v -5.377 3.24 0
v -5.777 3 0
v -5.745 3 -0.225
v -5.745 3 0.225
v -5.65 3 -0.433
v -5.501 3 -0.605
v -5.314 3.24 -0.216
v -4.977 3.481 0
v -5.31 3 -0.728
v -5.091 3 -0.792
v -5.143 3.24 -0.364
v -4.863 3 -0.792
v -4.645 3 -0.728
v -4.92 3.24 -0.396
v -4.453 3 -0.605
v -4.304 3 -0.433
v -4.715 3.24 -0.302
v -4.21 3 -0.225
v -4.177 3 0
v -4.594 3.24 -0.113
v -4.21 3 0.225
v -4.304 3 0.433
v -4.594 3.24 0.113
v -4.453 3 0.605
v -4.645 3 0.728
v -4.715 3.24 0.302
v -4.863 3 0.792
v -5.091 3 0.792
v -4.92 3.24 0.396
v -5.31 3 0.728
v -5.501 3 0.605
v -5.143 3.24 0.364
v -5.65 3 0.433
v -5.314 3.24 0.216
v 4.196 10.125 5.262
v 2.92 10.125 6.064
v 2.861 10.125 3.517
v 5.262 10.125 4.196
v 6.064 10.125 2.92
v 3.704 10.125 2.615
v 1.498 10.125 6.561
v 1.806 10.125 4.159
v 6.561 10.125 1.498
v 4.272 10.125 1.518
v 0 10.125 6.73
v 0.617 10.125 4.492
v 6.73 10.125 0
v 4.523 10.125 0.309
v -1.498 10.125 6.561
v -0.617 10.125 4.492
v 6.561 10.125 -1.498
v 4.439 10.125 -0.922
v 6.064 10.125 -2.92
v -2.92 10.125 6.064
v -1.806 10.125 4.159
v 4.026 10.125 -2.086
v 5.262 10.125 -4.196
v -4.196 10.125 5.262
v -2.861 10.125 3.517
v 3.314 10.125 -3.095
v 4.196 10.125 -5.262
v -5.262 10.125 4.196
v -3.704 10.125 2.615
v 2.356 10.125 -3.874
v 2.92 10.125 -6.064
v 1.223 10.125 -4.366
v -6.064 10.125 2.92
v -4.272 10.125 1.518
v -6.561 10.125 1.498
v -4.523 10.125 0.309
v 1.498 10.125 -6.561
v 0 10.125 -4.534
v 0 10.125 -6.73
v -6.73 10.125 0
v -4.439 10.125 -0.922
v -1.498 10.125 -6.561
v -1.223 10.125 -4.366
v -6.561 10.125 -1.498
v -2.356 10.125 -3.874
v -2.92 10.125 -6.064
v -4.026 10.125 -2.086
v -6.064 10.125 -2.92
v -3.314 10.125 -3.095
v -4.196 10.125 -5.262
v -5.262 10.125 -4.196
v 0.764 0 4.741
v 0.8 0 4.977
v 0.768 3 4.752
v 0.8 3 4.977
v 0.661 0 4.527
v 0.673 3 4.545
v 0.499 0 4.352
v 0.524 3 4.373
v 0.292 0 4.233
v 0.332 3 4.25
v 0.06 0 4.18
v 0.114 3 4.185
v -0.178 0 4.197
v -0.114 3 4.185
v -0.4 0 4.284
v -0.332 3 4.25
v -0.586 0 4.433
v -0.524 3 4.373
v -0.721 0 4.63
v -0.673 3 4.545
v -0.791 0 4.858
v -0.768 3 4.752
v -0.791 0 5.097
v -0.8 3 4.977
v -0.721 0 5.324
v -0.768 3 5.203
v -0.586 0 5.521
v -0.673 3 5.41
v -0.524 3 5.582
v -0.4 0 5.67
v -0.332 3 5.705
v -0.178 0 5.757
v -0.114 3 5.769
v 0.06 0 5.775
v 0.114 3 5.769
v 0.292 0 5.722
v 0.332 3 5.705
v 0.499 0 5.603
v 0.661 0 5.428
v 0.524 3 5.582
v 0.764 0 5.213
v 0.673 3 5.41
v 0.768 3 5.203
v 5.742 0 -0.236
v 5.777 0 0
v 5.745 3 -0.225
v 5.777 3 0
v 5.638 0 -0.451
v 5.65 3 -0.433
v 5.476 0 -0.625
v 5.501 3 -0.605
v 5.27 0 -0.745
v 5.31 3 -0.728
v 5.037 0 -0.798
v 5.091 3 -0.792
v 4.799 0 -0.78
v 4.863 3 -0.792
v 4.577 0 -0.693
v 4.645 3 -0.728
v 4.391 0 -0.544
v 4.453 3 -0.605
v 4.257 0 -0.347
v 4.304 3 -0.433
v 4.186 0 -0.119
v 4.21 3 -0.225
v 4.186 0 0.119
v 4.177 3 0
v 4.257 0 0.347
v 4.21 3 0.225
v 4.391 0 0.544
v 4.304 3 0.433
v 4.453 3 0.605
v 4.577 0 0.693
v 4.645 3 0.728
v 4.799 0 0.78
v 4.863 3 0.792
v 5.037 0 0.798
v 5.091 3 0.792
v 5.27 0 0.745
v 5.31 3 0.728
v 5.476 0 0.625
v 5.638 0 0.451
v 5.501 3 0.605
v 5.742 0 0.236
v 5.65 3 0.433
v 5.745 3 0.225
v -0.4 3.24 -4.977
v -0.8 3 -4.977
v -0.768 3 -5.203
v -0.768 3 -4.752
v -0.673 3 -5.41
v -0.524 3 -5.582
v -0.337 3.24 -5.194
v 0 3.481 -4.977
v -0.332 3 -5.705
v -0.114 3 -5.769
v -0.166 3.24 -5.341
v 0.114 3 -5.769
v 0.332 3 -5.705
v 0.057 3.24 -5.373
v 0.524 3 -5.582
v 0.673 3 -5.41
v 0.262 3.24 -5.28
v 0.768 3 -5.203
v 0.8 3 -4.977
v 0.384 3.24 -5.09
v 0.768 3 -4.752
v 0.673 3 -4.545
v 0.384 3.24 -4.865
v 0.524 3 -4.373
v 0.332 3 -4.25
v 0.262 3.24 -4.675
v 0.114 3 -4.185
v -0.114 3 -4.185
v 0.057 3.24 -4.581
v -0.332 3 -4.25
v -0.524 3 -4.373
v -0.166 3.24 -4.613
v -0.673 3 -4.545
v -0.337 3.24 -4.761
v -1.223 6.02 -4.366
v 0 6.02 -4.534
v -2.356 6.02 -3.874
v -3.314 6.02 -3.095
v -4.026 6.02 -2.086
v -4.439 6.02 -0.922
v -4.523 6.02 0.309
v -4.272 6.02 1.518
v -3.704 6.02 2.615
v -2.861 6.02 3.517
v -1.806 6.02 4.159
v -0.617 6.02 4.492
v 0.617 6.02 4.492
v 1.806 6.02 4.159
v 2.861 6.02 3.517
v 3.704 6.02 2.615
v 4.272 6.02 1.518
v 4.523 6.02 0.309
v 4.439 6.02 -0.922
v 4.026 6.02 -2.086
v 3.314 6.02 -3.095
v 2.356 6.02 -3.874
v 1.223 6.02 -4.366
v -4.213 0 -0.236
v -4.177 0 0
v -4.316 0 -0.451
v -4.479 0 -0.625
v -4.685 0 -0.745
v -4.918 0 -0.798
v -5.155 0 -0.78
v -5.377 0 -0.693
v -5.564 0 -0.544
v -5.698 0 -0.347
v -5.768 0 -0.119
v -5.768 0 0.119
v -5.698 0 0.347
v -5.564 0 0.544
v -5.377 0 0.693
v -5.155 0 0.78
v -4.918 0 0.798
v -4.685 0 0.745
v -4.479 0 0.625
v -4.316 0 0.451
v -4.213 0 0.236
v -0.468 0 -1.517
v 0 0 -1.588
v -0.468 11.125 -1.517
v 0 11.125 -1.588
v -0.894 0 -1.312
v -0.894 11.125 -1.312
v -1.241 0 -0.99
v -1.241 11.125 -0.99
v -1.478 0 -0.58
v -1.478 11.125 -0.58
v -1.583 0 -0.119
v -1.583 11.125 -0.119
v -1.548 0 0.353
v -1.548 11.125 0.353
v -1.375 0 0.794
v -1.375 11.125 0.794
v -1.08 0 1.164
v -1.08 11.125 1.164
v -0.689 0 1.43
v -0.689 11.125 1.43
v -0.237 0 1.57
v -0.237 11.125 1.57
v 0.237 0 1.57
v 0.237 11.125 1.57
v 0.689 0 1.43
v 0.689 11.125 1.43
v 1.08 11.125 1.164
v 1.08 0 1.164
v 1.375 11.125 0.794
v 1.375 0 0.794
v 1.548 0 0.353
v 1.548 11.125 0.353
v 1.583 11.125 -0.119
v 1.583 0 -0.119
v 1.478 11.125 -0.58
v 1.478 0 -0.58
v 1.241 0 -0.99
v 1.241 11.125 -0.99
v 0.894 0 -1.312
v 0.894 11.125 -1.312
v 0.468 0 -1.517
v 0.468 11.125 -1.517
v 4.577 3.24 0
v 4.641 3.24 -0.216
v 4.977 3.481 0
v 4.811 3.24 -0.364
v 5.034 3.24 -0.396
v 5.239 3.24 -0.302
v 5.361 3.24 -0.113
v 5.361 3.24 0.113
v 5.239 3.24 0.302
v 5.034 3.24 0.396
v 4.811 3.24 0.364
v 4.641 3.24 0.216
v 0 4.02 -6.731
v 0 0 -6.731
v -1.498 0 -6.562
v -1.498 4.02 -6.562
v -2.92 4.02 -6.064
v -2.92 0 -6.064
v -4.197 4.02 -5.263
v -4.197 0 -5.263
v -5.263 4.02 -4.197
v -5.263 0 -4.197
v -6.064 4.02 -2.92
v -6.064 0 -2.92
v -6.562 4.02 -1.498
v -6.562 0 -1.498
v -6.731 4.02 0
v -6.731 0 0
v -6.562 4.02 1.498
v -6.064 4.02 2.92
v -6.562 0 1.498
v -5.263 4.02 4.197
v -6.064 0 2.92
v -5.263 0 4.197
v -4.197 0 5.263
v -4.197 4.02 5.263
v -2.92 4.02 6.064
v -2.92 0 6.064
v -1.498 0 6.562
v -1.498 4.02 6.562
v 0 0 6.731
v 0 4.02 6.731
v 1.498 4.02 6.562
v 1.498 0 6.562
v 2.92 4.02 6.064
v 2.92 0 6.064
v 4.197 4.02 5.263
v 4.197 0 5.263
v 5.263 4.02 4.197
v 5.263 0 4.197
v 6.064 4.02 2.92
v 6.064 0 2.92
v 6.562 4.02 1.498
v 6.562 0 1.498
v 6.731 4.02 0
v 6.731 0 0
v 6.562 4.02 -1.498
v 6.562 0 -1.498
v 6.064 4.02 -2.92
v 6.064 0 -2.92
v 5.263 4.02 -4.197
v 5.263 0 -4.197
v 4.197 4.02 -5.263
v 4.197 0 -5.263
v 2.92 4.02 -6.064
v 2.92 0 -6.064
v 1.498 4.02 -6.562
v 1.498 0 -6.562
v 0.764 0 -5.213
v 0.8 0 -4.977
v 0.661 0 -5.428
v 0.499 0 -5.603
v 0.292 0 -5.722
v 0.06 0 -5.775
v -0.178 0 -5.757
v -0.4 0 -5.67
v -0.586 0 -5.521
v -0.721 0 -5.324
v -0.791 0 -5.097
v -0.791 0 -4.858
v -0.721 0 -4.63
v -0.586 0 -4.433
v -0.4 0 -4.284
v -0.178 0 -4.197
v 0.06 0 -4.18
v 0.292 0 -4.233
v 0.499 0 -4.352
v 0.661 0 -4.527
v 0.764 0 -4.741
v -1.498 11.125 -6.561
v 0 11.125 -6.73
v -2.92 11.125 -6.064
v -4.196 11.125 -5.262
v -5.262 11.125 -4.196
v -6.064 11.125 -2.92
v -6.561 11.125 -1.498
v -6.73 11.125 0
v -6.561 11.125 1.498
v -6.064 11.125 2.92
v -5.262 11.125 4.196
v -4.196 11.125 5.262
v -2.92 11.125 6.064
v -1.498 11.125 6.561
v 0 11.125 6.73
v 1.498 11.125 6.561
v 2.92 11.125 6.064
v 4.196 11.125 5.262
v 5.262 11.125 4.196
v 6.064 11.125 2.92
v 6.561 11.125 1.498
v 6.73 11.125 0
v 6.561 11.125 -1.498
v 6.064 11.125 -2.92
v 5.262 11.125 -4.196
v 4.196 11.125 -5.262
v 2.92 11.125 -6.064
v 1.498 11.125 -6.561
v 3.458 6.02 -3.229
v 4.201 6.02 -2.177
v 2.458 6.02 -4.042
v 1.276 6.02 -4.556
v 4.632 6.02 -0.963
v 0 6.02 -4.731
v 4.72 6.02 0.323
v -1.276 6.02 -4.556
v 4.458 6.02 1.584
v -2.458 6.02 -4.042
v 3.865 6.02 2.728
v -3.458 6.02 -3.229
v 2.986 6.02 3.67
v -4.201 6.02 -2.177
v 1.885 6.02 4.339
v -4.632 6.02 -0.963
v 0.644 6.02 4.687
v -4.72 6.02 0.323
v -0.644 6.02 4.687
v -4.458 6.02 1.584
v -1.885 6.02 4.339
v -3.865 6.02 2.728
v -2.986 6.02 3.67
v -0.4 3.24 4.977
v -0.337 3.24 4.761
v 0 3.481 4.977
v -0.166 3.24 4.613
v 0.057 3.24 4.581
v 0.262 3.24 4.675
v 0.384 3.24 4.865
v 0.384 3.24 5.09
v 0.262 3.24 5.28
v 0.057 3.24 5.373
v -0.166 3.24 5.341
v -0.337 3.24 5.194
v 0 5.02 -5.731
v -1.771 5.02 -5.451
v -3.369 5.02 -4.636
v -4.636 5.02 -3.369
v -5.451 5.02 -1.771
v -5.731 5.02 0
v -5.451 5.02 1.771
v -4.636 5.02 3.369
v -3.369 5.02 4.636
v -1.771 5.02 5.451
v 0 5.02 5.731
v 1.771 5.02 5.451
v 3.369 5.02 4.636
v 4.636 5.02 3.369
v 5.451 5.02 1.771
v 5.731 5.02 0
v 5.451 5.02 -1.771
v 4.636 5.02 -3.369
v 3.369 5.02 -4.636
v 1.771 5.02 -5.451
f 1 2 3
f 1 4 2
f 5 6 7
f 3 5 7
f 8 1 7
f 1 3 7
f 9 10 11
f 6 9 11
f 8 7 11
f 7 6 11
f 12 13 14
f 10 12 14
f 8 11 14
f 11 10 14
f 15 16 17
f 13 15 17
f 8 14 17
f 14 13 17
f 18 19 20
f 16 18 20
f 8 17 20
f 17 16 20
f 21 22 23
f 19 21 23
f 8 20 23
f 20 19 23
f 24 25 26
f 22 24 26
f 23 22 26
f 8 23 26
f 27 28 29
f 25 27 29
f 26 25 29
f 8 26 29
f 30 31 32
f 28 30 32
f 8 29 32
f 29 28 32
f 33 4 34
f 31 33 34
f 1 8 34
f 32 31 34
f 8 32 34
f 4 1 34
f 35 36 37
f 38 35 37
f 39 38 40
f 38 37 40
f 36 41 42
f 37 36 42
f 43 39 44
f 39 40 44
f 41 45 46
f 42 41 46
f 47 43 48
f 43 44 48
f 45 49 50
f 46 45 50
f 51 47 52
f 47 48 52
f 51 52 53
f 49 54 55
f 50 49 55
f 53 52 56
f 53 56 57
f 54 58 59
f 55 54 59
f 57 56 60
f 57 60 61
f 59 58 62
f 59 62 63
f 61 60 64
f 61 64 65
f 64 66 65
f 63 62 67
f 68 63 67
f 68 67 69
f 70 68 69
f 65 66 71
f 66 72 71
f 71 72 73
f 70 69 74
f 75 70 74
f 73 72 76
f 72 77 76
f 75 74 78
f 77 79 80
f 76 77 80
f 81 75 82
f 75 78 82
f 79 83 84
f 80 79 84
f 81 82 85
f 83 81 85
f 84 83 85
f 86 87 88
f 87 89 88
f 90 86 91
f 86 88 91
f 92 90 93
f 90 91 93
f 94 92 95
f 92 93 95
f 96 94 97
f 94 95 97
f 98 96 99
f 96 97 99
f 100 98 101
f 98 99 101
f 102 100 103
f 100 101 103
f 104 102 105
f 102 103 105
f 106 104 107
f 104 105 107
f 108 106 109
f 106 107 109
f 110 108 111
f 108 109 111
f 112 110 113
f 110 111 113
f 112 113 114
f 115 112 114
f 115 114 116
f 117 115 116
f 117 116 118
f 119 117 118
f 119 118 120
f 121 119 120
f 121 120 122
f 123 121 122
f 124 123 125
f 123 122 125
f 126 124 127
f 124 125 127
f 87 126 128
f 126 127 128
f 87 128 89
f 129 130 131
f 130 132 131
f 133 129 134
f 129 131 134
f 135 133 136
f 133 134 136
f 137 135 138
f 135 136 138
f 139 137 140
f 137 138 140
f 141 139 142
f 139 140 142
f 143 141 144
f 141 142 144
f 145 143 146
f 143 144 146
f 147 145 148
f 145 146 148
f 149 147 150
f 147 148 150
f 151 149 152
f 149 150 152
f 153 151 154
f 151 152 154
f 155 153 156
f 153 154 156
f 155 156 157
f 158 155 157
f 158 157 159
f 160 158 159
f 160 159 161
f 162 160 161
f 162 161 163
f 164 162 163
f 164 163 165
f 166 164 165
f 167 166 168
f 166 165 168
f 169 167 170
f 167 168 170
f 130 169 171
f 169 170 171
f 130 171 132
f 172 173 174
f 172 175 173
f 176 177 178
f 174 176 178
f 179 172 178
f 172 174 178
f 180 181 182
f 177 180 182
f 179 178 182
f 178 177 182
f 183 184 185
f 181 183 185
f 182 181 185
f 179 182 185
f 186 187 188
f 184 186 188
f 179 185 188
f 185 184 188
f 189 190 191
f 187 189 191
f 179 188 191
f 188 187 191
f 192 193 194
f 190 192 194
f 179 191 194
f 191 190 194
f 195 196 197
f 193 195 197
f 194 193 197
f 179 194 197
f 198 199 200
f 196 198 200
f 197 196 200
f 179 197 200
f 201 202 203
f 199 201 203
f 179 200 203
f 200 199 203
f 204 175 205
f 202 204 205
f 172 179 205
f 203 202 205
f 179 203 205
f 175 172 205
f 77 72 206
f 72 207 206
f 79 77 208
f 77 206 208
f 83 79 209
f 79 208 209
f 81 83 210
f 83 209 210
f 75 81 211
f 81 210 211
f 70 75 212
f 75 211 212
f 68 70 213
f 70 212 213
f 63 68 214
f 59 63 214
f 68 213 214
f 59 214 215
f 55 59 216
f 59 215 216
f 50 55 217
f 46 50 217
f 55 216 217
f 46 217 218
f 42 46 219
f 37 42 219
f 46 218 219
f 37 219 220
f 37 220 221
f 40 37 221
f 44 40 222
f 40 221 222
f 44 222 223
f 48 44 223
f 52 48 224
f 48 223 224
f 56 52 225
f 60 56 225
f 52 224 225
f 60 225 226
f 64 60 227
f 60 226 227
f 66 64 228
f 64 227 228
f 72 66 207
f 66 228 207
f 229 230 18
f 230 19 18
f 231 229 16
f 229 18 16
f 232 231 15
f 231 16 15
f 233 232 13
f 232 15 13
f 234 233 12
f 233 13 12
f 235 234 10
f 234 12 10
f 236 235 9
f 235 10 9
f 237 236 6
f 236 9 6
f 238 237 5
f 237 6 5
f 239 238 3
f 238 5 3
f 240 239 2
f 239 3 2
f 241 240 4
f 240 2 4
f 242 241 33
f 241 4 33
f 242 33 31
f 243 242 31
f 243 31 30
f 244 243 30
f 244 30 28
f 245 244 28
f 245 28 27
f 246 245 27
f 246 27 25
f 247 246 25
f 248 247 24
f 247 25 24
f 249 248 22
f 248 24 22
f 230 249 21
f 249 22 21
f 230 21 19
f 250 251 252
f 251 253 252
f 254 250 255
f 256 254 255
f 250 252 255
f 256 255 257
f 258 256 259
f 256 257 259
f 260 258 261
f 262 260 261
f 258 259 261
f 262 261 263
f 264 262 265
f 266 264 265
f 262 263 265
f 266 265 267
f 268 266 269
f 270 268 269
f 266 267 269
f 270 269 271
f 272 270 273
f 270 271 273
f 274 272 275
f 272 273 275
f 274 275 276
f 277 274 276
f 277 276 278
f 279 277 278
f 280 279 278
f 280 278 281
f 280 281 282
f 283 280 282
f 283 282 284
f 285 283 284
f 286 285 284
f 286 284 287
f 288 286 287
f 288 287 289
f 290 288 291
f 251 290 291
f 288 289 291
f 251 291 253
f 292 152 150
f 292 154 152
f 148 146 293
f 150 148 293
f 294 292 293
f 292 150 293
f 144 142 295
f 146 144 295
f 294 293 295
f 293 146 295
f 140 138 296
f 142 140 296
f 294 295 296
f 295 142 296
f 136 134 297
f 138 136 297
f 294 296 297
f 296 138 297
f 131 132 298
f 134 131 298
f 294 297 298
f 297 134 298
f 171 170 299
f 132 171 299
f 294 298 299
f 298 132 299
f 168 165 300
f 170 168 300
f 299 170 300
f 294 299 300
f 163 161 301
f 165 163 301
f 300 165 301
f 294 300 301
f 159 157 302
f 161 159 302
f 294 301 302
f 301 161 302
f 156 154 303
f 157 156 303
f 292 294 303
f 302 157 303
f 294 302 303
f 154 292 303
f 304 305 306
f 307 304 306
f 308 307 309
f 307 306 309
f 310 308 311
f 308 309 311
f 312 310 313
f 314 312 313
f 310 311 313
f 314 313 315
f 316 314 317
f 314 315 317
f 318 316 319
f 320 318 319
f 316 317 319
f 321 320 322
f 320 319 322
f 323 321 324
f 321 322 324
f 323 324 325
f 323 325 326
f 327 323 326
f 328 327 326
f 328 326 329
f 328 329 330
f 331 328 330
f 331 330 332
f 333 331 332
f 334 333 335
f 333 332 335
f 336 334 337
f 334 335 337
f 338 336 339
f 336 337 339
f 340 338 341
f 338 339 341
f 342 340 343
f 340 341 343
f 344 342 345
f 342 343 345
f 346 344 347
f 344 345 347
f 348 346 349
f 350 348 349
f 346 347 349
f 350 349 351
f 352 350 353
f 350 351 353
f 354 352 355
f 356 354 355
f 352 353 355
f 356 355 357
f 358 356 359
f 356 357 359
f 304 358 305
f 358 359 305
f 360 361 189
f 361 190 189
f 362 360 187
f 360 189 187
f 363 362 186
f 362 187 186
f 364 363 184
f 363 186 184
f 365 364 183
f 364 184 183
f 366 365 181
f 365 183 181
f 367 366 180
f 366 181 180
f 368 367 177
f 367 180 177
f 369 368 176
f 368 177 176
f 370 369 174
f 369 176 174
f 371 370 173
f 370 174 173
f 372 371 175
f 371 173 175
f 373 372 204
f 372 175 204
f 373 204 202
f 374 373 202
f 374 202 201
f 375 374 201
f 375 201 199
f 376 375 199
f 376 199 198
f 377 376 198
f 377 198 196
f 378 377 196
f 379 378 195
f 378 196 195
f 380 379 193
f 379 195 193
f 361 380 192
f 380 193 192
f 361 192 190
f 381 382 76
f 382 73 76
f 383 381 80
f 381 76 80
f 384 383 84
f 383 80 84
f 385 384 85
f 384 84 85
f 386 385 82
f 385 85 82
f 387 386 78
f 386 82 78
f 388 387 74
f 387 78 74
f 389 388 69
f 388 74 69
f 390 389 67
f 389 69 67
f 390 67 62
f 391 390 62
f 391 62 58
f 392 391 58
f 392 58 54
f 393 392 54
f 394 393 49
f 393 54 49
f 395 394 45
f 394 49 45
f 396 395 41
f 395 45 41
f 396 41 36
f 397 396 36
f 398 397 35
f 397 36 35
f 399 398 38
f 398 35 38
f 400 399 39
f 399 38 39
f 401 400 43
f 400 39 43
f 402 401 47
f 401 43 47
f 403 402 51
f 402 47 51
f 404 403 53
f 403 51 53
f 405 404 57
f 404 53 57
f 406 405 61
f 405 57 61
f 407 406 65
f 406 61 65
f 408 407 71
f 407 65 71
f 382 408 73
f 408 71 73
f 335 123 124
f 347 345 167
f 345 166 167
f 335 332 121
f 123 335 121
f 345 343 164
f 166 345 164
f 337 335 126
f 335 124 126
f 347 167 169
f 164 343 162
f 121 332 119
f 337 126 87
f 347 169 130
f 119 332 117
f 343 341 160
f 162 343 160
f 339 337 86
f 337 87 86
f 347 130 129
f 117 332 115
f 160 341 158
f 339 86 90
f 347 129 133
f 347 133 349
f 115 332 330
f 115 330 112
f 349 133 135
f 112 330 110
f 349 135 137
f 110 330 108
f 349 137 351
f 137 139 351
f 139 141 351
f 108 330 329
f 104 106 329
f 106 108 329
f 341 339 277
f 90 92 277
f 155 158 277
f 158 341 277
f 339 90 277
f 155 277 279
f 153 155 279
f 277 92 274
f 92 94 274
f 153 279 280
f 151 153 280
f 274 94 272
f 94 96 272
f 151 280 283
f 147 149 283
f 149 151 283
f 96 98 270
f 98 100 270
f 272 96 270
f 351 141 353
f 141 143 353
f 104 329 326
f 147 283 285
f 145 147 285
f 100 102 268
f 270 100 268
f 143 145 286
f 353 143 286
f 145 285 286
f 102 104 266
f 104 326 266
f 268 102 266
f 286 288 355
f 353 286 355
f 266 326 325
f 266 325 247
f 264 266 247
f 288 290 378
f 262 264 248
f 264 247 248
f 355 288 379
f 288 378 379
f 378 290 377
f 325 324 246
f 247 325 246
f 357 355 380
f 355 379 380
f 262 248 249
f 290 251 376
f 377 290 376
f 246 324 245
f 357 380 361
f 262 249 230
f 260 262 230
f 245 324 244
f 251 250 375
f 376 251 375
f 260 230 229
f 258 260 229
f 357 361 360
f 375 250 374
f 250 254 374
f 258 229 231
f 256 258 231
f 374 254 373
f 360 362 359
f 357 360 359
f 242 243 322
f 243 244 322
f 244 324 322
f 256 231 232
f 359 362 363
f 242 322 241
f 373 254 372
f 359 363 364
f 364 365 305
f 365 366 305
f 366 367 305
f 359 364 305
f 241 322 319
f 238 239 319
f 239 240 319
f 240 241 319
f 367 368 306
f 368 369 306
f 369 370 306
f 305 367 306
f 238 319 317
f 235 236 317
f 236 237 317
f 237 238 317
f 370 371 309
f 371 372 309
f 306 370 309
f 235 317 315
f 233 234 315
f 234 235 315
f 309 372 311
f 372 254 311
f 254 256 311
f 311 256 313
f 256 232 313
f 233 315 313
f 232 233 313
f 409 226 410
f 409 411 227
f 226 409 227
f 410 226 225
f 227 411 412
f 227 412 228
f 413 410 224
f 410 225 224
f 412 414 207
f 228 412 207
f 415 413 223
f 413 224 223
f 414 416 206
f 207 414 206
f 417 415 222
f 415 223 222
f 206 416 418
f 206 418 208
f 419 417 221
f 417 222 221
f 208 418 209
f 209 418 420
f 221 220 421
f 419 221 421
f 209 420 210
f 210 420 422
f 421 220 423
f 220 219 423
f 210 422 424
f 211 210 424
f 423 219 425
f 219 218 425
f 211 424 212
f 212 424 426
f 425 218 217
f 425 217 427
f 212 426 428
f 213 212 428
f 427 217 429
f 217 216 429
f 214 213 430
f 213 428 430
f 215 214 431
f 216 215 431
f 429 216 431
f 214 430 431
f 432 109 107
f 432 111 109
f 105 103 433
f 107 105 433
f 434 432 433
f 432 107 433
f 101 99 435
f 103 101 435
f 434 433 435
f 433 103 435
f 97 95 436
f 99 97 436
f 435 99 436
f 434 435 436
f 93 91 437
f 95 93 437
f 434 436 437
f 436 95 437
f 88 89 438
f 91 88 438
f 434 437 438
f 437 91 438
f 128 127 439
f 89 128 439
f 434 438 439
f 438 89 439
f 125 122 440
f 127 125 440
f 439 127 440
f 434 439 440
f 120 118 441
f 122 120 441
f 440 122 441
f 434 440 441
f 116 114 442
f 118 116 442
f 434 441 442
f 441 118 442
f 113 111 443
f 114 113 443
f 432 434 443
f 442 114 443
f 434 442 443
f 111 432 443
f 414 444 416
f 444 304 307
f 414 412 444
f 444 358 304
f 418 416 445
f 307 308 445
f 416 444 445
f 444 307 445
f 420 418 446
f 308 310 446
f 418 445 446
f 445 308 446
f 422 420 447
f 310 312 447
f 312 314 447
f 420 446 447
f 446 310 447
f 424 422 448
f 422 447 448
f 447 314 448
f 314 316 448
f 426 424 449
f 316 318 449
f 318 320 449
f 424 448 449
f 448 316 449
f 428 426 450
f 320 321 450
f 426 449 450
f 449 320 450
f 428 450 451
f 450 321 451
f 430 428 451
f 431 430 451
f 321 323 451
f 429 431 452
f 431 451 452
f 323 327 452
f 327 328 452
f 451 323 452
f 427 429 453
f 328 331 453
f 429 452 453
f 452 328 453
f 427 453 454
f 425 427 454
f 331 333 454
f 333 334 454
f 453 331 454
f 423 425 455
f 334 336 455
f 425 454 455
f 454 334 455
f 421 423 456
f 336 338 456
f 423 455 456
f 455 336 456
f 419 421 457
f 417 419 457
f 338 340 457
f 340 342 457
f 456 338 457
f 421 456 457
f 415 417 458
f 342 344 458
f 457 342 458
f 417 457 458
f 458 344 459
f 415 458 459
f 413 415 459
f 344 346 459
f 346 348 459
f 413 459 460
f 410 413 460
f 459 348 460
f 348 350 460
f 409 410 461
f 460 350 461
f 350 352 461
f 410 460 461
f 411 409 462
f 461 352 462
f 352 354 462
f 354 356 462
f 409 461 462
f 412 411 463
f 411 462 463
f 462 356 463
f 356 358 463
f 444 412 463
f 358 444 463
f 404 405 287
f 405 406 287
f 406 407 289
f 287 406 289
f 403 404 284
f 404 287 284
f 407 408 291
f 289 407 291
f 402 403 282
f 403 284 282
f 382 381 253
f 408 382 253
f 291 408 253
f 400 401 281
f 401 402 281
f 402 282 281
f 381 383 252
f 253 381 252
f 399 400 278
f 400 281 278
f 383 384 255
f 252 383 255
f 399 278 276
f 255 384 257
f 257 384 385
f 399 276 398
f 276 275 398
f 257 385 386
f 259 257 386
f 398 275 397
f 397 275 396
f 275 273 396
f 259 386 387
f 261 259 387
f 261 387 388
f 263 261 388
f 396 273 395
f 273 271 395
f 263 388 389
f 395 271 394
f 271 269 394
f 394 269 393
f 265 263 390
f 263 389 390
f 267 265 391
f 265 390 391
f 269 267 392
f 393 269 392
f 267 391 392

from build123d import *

# Parameters (mm, degrees)
CHAMFER1_SIZE             = 2
M2X0_4_TAPPED_HOLE1_D     = 1.6
M2X0_4_TAPPED_HOLE1_DEPTH = 3
M2X0_4_TAPPED_HOLE1_TIP   = 0.480688495


with BuildPart() as part:
    # Sketch1 → Revolve1 (revolve)
    with BuildSketch(Plane.XY, mode=Mode.PRIVATE) as revolve1_sk:
        Polygon((1.5875, 0), (1.5875, 11.1252), (6.73, 11.1252), (6.73, 10.1252), (4.5339, 10.1252), (4.5339, 6.019800098), (6.731, 6.019800098), (6.731, 0), align=None)
    revolve(revolve1_sk.sketch.rotate(Axis((0, 0, 0), (0, 1, 0)), 90), axis=Axis((0, 0, 0), (0, 1, 0)))

    # Chamfer1
    chamfer1_edges = [part.edges().sort_by_distance(p)[0] for p in [
        (0, 6.019800098, 6.731),
    ]]
    chamfer(chamfer1_edges, length=CHAMFER1_SIZE)

    # M2x0.4 Tapped Hole1
    with Locations(Plane(origin=(0, 0, 0), x_dir=(-1, 0, 0), z_dir=(0, -1, 0))):
        with Locations((0, -4.977300526), (-4.977300526, 0), (0, 4.977300526), (4.977300526, 0), (0, 0)):
            Hole(M2X0_4_TAPPED_HOLE1_D / 2, depth=M2X0_4_TAPPED_HOLE1_DEPTH)
            with Locations((0, 0, -(M2X0_4_TAPPED_HOLE1_DEPTH + M2X0_4_TAPPED_HOLE1_TIP / 2))):  # 118° drill point
                Cone(0, M2X0_4_TAPPED_HOLE1_D / 2, M2X0_4_TAPPED_HOLE1_TIP, mode=Mode.SUBTRACT)


solid = part.part
